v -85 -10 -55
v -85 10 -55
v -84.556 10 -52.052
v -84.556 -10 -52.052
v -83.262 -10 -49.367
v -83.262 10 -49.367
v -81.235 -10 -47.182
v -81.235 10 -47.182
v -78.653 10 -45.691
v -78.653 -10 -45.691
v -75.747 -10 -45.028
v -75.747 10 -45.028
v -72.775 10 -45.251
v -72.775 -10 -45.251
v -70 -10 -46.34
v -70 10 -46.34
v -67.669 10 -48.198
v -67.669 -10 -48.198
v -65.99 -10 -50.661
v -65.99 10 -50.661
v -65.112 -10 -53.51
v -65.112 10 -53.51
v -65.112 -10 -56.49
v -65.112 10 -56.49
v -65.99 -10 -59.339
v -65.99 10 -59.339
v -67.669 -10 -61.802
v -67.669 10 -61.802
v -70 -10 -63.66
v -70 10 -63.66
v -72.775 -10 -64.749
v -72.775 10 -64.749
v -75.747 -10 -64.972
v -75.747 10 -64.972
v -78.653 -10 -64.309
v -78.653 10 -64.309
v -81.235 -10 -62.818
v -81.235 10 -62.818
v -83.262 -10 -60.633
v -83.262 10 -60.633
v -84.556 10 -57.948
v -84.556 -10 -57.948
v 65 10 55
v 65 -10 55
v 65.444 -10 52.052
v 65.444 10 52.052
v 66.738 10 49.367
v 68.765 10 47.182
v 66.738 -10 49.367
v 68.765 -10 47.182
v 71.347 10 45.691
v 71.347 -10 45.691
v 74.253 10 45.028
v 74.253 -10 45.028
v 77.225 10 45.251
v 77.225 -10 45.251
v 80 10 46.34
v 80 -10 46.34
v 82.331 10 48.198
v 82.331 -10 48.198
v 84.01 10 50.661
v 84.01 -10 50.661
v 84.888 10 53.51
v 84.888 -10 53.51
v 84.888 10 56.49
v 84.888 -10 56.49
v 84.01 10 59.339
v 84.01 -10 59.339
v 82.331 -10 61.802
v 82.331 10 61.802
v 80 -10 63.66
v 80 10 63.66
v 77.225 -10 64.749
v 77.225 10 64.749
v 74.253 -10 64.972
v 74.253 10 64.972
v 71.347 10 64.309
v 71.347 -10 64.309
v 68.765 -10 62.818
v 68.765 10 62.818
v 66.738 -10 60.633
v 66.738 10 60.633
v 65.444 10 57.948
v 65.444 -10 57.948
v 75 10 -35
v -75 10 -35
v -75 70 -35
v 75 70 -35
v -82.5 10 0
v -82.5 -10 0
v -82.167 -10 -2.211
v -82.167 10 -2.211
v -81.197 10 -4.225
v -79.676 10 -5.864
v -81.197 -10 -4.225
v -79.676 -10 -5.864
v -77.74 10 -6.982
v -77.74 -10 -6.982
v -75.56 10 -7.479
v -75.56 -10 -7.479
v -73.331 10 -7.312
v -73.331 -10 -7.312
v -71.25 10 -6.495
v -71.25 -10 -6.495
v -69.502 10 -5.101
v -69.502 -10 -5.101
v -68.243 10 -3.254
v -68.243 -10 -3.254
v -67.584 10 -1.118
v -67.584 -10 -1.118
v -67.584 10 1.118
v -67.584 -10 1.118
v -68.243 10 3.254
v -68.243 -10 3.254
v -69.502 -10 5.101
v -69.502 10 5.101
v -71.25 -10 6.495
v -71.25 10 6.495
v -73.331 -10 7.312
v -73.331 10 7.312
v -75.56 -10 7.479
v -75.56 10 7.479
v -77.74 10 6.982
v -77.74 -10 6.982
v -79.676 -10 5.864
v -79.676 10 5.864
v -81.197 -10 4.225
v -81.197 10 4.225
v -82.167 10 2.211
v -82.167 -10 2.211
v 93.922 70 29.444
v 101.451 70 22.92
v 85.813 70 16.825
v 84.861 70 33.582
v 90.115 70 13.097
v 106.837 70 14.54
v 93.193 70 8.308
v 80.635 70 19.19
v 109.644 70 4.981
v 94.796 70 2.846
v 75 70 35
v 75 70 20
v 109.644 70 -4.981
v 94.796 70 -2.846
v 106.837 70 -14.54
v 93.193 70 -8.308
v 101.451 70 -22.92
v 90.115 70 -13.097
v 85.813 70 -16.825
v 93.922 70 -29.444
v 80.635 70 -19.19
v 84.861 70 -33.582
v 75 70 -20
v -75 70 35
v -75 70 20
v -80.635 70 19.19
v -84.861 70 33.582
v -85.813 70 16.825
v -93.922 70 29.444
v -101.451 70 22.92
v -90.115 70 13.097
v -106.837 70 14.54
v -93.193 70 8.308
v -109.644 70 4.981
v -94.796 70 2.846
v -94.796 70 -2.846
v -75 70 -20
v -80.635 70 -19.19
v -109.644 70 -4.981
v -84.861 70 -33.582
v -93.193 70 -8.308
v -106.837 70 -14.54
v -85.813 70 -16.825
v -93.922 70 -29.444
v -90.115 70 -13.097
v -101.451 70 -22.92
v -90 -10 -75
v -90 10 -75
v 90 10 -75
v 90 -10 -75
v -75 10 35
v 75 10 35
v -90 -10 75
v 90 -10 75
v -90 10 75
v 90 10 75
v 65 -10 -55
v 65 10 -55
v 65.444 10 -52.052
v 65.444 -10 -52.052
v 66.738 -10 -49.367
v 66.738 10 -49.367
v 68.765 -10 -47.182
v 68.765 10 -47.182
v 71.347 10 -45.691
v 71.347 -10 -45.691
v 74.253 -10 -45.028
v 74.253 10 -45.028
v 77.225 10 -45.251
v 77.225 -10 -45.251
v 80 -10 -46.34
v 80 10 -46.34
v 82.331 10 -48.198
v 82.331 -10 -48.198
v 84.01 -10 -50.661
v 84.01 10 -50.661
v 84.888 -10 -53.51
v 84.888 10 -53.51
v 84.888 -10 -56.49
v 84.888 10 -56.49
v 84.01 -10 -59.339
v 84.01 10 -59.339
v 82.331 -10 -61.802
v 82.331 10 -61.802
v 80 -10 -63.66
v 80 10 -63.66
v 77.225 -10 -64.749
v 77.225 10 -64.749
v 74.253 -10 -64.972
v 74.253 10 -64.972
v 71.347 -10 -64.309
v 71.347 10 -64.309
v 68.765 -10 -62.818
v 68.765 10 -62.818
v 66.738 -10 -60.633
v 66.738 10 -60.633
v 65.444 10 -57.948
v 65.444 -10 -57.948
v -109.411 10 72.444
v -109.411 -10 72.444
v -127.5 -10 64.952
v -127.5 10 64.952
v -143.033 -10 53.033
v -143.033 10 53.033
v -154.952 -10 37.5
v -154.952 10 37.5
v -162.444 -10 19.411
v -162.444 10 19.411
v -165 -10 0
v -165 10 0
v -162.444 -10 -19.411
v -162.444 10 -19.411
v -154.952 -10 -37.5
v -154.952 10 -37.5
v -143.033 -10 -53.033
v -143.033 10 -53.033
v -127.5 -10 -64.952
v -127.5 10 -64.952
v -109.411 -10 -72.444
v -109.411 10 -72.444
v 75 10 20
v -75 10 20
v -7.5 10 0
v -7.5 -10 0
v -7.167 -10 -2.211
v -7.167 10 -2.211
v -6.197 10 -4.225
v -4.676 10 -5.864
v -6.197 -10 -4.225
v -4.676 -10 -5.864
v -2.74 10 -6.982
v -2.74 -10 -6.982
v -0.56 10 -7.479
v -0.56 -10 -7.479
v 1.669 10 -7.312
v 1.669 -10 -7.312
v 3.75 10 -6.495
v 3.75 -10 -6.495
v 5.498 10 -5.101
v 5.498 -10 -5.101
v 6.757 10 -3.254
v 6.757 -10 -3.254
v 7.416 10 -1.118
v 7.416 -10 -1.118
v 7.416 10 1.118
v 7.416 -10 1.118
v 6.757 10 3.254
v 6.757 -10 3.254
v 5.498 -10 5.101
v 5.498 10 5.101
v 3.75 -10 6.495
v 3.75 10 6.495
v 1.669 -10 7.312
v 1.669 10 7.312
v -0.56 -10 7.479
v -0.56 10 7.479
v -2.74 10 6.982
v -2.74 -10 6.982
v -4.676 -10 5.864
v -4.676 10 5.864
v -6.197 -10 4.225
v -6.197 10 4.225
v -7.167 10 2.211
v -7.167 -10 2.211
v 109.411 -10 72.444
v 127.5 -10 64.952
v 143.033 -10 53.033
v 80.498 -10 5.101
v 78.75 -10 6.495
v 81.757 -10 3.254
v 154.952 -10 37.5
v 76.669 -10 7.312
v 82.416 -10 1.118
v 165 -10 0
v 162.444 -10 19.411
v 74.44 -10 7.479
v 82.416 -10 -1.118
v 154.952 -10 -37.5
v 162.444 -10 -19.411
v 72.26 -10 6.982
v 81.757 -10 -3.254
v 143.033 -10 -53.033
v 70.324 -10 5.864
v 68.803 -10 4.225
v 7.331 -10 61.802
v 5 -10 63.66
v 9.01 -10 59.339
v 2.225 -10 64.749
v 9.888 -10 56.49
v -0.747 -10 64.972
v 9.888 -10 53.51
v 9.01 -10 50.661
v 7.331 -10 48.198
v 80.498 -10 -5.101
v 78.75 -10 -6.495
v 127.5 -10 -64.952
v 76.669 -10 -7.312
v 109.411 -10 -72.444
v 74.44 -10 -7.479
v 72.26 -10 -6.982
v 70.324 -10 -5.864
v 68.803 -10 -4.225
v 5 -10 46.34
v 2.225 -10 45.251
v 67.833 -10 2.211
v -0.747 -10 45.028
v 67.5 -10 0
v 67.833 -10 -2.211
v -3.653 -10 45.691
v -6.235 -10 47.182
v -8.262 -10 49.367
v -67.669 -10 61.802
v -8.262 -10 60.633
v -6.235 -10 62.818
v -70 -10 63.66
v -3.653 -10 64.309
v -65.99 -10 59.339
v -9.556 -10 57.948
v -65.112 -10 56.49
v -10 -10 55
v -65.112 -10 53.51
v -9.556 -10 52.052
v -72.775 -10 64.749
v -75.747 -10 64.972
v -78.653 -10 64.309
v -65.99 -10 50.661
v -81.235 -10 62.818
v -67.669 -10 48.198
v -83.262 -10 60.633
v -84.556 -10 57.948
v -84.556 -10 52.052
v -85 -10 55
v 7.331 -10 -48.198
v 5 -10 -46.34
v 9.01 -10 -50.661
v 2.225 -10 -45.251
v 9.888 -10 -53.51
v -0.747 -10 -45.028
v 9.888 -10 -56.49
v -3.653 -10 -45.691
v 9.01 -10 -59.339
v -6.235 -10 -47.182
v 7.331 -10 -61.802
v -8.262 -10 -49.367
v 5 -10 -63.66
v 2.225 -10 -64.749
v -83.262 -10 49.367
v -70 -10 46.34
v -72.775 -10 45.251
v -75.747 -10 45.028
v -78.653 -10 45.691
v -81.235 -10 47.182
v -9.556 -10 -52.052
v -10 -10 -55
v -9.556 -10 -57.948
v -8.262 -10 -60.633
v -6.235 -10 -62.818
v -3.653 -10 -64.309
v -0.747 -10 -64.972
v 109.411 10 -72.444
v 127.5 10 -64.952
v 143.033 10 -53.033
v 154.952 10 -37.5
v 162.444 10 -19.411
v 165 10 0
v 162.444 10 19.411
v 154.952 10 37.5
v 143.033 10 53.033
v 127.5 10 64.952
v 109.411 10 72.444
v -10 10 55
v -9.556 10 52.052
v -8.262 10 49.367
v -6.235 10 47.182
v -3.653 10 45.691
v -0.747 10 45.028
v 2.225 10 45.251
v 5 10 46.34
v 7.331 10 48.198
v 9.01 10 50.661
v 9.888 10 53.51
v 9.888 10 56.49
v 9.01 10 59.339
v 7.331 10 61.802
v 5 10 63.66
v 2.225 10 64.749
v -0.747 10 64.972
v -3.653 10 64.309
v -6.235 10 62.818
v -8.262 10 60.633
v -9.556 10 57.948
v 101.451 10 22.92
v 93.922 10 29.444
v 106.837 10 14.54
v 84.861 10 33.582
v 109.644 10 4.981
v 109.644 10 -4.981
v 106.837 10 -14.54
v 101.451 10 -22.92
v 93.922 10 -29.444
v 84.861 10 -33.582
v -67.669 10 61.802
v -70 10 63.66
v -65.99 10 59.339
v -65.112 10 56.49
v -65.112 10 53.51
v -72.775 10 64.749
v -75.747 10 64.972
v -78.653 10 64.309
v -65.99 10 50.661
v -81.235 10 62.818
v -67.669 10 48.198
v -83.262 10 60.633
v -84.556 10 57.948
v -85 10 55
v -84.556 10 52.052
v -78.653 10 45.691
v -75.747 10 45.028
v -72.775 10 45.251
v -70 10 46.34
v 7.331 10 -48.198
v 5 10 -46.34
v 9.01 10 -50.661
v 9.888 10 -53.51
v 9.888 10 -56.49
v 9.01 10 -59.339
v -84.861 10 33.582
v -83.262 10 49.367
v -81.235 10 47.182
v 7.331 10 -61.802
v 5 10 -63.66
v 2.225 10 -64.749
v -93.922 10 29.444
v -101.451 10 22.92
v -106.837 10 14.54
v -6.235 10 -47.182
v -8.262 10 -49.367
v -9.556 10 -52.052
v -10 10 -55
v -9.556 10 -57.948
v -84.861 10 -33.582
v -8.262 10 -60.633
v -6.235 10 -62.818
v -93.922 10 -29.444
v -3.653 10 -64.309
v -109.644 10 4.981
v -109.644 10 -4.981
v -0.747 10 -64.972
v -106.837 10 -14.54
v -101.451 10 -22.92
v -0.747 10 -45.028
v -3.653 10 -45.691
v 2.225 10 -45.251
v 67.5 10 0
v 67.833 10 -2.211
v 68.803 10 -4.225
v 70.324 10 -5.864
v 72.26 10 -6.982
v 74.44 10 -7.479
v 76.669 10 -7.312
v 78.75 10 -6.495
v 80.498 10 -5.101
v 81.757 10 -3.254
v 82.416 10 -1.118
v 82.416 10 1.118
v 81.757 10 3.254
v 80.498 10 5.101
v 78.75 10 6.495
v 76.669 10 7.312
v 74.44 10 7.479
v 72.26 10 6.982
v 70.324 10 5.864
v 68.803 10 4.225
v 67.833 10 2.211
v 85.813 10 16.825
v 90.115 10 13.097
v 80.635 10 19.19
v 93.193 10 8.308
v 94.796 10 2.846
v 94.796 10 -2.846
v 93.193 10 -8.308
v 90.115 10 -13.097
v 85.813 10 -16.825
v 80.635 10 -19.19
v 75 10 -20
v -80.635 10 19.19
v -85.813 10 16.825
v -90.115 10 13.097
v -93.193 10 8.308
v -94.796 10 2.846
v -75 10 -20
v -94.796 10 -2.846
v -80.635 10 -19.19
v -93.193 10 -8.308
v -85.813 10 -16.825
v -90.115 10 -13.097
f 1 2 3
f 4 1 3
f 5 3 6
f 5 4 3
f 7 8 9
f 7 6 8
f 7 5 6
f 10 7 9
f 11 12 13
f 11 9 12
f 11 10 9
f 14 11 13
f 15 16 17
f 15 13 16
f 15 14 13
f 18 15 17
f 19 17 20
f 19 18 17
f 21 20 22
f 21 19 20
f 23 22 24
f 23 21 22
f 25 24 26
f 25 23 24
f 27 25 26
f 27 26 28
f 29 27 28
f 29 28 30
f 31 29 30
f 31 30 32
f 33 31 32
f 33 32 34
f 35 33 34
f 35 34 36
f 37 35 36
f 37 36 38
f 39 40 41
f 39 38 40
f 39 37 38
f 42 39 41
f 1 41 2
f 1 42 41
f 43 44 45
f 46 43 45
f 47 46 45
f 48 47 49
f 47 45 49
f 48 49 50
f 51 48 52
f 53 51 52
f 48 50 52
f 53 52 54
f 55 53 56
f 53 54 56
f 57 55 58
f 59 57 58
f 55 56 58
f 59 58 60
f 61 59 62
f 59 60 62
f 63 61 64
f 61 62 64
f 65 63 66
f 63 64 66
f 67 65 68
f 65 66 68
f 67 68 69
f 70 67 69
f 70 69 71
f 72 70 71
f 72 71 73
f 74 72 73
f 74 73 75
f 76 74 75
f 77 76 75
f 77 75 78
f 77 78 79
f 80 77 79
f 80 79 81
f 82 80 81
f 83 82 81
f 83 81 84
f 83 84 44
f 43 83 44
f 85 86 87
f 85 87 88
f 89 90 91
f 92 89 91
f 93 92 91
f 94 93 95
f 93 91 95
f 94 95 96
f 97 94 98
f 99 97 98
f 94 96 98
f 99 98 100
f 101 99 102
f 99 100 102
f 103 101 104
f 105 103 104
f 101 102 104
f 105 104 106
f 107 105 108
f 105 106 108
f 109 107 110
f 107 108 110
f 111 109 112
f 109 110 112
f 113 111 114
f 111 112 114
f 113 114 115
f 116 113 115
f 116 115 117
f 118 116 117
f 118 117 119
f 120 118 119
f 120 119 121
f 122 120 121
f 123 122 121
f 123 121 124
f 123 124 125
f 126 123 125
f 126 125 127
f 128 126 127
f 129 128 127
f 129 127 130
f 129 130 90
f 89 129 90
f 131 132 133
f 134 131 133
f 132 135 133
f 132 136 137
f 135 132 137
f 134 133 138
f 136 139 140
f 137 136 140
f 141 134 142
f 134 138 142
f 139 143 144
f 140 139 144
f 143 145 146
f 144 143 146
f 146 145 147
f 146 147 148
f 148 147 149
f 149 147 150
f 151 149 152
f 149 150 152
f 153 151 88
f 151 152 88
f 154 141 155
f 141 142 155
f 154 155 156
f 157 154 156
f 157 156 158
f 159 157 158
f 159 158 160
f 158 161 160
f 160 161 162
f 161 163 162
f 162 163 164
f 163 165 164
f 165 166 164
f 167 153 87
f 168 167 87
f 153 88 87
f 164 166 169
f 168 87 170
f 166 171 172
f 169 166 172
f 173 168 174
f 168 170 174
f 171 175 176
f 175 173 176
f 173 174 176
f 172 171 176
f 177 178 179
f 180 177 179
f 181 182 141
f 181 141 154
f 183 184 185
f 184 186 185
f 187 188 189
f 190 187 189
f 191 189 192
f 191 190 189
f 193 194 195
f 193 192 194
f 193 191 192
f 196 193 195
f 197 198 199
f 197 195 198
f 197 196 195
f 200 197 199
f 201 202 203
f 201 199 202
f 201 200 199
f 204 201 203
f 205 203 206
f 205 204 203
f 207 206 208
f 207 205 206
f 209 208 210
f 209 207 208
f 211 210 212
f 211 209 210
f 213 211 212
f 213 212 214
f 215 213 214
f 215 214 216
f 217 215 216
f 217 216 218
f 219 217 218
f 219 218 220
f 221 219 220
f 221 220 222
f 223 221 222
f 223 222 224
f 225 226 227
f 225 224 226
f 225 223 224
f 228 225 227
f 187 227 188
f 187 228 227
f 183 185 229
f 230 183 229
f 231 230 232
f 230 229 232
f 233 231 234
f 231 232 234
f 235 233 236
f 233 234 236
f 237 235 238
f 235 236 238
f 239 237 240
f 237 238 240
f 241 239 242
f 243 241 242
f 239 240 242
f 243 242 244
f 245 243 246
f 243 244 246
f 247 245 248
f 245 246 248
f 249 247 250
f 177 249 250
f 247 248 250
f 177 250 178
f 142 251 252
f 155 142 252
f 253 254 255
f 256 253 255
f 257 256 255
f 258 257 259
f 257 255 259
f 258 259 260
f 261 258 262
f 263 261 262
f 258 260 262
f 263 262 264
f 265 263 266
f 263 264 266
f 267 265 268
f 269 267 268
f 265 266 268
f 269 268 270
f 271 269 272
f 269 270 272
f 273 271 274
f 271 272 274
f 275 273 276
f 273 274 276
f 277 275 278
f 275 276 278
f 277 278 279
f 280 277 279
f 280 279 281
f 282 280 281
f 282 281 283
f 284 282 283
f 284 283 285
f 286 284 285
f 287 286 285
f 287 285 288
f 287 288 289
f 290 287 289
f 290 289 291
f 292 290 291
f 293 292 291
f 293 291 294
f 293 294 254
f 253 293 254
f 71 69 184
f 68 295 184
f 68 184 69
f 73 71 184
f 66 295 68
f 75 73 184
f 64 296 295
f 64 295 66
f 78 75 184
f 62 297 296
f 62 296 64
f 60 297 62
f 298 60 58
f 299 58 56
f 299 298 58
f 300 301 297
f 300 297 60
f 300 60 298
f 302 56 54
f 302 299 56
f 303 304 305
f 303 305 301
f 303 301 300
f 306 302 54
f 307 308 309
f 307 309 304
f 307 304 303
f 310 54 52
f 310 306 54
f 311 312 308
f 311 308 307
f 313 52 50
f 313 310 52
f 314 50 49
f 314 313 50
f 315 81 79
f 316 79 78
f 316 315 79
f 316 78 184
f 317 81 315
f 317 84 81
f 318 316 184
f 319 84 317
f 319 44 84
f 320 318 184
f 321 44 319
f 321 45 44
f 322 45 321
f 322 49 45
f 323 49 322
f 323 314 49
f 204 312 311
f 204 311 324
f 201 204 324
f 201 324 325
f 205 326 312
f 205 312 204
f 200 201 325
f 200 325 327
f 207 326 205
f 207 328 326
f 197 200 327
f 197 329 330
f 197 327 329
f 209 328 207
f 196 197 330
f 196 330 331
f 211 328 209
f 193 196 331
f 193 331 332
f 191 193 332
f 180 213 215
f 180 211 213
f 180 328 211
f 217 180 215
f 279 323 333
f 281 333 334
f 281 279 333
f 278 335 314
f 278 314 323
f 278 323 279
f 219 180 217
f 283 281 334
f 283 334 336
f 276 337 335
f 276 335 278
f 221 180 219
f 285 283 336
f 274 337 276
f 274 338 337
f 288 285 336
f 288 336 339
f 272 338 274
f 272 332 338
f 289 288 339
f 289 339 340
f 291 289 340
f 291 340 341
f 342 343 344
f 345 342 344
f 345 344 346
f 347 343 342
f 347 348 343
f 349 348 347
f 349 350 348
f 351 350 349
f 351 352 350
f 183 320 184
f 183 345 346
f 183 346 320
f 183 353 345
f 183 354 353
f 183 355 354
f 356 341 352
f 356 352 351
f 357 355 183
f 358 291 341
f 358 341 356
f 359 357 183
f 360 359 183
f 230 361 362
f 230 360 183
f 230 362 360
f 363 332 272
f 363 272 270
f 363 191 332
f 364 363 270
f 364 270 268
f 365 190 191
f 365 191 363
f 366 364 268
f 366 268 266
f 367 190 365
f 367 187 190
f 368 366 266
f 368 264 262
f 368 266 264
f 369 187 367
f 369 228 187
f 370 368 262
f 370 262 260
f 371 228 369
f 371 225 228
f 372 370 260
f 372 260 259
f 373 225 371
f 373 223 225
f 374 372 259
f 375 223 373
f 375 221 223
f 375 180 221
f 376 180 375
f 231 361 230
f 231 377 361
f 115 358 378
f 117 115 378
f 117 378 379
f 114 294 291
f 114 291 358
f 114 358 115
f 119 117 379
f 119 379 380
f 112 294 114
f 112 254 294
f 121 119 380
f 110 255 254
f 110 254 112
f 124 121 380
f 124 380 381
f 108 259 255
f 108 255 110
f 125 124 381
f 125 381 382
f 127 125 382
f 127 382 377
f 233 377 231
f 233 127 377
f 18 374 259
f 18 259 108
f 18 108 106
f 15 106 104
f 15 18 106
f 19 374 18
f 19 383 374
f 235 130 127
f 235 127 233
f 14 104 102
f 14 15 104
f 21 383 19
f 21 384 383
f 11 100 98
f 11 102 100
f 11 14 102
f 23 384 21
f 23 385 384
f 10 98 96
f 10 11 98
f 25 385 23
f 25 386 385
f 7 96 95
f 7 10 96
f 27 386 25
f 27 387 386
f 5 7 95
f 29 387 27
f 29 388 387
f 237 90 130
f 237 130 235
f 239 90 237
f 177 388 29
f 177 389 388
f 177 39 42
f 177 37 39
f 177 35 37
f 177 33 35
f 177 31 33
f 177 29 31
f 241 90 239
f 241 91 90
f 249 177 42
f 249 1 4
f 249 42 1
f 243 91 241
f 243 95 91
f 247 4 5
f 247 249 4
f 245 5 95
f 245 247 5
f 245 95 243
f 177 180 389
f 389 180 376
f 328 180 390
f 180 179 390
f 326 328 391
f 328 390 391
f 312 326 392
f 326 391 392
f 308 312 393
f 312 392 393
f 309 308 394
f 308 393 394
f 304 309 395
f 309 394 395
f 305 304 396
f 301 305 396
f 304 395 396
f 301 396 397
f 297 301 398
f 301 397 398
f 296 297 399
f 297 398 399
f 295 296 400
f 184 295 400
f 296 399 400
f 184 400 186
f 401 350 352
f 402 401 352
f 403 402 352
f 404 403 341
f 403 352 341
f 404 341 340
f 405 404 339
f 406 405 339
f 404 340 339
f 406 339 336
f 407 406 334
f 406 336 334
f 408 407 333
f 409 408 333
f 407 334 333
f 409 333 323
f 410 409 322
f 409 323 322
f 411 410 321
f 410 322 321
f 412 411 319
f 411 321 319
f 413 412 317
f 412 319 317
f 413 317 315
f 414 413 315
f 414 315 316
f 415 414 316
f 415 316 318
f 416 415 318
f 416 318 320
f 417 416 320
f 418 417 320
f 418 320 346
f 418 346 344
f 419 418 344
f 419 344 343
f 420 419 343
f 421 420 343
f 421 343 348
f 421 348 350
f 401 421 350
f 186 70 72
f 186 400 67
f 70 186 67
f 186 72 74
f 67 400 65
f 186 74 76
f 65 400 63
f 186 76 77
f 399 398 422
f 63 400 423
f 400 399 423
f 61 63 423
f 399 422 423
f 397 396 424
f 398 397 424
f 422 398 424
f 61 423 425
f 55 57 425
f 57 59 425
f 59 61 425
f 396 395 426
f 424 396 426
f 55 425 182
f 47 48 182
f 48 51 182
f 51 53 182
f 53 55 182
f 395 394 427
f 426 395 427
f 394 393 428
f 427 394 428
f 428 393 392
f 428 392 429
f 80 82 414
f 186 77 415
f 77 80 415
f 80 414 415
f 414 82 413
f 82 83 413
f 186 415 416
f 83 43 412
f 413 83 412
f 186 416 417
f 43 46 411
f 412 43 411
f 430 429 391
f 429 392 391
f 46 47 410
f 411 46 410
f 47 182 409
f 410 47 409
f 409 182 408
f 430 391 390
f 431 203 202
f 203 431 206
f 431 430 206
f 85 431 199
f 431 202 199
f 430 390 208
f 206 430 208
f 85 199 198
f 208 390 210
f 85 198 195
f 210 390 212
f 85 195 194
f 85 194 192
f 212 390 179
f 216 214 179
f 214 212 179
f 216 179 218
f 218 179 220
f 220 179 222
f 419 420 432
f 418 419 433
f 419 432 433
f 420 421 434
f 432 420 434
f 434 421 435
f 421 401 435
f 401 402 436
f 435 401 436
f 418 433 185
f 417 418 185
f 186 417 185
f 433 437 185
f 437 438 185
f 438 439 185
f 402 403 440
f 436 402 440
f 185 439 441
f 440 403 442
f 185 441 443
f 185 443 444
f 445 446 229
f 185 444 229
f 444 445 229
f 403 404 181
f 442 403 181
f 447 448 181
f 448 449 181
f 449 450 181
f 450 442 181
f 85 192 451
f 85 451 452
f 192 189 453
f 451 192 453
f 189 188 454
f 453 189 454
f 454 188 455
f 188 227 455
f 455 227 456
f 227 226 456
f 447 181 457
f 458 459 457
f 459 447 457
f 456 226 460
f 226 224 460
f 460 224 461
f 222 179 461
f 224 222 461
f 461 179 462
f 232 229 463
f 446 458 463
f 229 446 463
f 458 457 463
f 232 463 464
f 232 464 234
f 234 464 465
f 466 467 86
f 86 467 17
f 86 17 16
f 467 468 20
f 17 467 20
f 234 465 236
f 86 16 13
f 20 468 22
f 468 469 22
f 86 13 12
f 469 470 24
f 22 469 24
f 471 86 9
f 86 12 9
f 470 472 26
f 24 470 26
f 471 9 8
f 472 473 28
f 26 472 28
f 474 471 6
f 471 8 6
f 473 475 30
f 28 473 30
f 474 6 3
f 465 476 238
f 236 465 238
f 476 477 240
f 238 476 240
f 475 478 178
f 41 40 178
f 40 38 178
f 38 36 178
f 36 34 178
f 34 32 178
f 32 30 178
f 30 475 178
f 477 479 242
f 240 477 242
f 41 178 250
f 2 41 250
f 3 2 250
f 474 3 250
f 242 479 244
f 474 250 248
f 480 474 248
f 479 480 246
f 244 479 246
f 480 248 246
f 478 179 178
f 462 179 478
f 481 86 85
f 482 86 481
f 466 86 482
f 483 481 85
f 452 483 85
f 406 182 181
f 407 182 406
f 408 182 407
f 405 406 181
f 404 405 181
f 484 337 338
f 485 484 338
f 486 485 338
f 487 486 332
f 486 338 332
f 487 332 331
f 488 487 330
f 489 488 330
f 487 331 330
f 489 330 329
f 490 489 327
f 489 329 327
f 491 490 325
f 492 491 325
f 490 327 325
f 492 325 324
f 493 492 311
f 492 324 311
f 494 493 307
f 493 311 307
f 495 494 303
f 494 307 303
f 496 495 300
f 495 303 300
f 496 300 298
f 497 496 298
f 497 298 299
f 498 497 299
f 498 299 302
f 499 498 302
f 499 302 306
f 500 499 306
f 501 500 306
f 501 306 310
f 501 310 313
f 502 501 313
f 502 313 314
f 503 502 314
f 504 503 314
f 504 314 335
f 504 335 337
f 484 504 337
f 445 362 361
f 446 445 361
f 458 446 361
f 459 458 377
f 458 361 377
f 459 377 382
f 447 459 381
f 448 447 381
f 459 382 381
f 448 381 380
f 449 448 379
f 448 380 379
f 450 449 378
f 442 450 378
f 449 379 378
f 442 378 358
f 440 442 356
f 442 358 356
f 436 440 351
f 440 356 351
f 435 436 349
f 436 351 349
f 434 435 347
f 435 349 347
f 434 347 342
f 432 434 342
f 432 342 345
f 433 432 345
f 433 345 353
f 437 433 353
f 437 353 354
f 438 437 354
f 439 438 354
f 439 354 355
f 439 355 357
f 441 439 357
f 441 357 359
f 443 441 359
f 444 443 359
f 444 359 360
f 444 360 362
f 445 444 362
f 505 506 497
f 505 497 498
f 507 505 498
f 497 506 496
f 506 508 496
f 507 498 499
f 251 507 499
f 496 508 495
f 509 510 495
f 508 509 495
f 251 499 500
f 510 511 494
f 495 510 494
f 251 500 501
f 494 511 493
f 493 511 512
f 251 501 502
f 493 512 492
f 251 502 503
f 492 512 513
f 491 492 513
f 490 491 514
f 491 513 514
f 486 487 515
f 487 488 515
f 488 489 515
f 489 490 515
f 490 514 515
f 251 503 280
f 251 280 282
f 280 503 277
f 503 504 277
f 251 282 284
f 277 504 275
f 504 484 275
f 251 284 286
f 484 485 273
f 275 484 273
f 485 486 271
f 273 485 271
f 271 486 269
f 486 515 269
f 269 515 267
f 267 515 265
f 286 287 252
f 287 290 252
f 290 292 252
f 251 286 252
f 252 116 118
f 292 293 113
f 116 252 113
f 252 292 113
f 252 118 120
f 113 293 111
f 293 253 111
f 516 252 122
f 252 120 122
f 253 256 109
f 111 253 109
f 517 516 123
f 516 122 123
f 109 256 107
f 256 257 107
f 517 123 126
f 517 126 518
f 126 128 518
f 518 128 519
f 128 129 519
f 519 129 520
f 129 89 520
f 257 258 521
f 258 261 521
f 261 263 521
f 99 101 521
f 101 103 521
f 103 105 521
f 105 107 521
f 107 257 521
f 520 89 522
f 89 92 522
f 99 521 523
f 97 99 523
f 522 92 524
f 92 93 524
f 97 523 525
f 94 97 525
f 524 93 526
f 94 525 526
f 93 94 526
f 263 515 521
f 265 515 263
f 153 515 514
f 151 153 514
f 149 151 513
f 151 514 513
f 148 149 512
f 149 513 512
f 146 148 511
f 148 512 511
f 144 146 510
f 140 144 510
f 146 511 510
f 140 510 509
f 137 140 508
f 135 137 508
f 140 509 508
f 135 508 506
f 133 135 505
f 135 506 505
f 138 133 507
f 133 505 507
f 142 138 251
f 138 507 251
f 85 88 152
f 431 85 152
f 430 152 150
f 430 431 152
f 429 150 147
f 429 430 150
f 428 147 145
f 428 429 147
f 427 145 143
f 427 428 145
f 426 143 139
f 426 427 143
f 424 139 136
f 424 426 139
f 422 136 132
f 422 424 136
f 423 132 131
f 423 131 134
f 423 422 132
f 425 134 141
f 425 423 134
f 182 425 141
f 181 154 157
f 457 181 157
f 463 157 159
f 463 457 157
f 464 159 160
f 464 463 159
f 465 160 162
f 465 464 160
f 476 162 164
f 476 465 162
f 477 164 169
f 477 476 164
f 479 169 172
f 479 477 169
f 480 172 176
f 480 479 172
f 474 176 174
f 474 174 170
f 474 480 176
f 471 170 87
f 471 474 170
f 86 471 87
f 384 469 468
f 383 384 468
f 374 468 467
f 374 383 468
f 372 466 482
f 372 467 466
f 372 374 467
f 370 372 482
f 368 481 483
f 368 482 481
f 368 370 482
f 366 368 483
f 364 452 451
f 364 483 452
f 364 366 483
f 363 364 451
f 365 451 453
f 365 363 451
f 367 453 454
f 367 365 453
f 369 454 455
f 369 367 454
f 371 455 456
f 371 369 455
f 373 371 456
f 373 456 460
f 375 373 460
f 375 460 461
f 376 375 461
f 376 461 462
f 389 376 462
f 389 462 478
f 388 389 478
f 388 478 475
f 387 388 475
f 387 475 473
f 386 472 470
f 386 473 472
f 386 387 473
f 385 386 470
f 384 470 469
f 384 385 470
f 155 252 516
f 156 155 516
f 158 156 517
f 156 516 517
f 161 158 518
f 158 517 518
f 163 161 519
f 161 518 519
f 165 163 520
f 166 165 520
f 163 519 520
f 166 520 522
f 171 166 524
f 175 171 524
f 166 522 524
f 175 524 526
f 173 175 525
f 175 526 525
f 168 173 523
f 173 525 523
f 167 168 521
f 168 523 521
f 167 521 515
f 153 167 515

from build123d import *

# Parameters (mm, degrees)
BOSS_EXTRUDE1_DEPTH = 10
BOSS_EXTRUDE2_DEPTH = 60
HOLE1_D             = 20
HOLE2_D             = 15


with BuildPart() as part:
    # Sketch1 → Boss-Extrude1 (new, symmetric)
    with BuildSketch(Plane(origin=(0, 0, 0), x_dir=(1, 0, 0), z_dir=(0, 1, 0))):
        with BuildLine():
            Line((-90, 75), (90, 75))
            ThreePointArc((90, 75), (165, 0), (90, -75))
            Line((90, -75), (-90, -75))
            ThreePointArc((-90, -75), (-165, 0), (-90, 75))
        make_face()
    extrude(amount=BOSS_EXTRUDE1_DEPTH, both=True)

    # Sketch2 → Boss-Extrude2 (add)
    with BuildSketch(Plane(origin=(0, 10, 0), x_dir=(1, 0, 0), z_dir=(0, 1, 0))):
        with BuildLine():
            Line((-75, 35), (75, 35))
            ThreePointArc((75, 35), (110, 0), (75, -35))
            Line((75, -35), (-75, -35))
            ThreePointArc((-75, -35), (-110, 0), (-75, 35))
        make_face()
        with BuildLine():
            Line((-75, 20), (75, 20))
            ThreePointArc((75, 20), (95, 0), (75, -20))
            Line((75, -20), (-75, -20))
            ThreePointArc((-75, -20), (-95, 0), (-75, 20))
        make_face(mode=Mode.SUBTRACT)
    extrude(amount=BOSS_EXTRUDE2_DEPTH)

    # Hole1 (through all)
    with Locations(Plane(origin=(0, 10, 0), x_dir=(1, 0, 0), z_dir=(0, 1, 0))):
        with Locations((75, -55), (0, -55), (-75, -55)):
            hole1 = Hole(HOLE1_D / 2)

    # Mirror1: Hole1 across plane
    add(hole1.mirror(Plane.XY), mode=Mode.SUBTRACT)

    # Hole2 (through all)
    with Locations(Plane(origin=(0, 10, 0), x_dir=(1, 0, 0), z_dir=(0, 1, 0))):
        with Locations((0, 0), (75, 0), (-75, 0)):
            Hole(HOLE2_D / 2)


solid = part.part
